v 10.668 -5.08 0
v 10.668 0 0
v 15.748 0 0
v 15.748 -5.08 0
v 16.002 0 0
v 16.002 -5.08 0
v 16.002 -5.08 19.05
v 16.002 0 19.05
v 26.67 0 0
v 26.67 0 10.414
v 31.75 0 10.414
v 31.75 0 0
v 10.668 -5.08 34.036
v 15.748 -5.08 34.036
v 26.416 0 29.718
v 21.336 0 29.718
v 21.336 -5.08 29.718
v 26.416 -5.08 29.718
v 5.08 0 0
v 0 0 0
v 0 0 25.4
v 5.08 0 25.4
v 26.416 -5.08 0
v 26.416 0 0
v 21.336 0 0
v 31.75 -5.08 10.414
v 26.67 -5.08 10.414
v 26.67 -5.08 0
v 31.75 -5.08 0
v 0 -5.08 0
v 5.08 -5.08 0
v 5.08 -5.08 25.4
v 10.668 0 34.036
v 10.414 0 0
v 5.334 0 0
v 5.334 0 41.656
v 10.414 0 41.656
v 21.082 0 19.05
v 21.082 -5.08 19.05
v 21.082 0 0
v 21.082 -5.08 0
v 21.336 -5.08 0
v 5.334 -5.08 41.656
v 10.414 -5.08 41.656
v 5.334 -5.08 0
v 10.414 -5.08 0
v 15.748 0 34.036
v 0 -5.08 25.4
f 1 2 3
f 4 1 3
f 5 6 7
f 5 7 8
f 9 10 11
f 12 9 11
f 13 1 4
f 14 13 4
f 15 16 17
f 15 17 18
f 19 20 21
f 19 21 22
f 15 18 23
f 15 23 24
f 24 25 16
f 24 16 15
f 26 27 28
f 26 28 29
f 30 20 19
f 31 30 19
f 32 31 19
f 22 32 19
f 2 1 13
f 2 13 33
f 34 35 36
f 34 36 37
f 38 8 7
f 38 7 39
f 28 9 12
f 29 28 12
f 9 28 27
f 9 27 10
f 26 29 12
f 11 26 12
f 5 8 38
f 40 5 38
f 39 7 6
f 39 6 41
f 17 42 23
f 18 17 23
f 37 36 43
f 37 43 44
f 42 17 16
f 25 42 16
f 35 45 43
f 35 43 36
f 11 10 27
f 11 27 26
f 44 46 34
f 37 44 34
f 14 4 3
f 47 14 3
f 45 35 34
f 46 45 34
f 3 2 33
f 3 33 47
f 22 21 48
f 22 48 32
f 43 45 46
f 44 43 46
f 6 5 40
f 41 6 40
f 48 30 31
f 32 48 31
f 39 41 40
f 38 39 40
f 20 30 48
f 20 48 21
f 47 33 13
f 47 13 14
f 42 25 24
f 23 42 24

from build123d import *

# Parameters (mm, degrees)
F0_W     = 5.08
F0_H     = 5.08
F2_DEPTH = 25.4
F1_W     = 5.08
F1_H     = 5.08
F3_DEPTH = 41.656
F4_DEPTH = 34.036
F5_DEPTH = 19.05
F6_DEPTH = 29.718
F7_DEPTH = 10.414


with BuildPart() as f2:
    # F0 (on Top) → F2 (new body)
    with BuildSketch(Plane.XY):
        with Locations((2.54, -2.54)):
            Rectangle(F0_W, F0_H)
    extrude(amount=F2_DEPTH)


with BuildPart() as f3:
    # F1 (on Top) → F3 (new body)
    with BuildSketch(Plane.XY):
        with Locations((7.874, -2.54)):
            Rectangle(F1_W, F1_H)
    extrude(amount=F3_DEPTH)


with BuildPart() as f4:
    # F1 (on Top) → F4 (new body)
    with BuildSketch(Plane.XY):
        with Locations((13.208, -2.54)):
            Rectangle(F1_W, F1_H)
    extrude(amount=F4_DEPTH)


with BuildPart() as f5:
    # F1 (on Top) → F5 (new body)
    with BuildSketch(Plane.XY):
        with Locations((18.542, -2.54)):
            Rectangle(F1_W, F1_H)
    extrude(amount=F5_DEPTH)


with BuildPart() as f6:
    # F1 (on Top) → F6 (new body)
    with BuildSketch(Plane.XY):
        with Locations((23.876, -2.54)):
            Rectangle(F1_W, F1_H)
    extrude(amount=F6_DEPTH)


with BuildPart() as f7:
    # F1 (on Top) → F7 (new body)
    with BuildSketch(Plane.XY):
        with Locations((29.21, -2.54)):
            Rectangle(F1_W, F1_H)
    extrude(amount=F7_DEPTH)


solid = Compound([f2.part, f3.part, f4.part, f5.part, f6.part, f7.part])
